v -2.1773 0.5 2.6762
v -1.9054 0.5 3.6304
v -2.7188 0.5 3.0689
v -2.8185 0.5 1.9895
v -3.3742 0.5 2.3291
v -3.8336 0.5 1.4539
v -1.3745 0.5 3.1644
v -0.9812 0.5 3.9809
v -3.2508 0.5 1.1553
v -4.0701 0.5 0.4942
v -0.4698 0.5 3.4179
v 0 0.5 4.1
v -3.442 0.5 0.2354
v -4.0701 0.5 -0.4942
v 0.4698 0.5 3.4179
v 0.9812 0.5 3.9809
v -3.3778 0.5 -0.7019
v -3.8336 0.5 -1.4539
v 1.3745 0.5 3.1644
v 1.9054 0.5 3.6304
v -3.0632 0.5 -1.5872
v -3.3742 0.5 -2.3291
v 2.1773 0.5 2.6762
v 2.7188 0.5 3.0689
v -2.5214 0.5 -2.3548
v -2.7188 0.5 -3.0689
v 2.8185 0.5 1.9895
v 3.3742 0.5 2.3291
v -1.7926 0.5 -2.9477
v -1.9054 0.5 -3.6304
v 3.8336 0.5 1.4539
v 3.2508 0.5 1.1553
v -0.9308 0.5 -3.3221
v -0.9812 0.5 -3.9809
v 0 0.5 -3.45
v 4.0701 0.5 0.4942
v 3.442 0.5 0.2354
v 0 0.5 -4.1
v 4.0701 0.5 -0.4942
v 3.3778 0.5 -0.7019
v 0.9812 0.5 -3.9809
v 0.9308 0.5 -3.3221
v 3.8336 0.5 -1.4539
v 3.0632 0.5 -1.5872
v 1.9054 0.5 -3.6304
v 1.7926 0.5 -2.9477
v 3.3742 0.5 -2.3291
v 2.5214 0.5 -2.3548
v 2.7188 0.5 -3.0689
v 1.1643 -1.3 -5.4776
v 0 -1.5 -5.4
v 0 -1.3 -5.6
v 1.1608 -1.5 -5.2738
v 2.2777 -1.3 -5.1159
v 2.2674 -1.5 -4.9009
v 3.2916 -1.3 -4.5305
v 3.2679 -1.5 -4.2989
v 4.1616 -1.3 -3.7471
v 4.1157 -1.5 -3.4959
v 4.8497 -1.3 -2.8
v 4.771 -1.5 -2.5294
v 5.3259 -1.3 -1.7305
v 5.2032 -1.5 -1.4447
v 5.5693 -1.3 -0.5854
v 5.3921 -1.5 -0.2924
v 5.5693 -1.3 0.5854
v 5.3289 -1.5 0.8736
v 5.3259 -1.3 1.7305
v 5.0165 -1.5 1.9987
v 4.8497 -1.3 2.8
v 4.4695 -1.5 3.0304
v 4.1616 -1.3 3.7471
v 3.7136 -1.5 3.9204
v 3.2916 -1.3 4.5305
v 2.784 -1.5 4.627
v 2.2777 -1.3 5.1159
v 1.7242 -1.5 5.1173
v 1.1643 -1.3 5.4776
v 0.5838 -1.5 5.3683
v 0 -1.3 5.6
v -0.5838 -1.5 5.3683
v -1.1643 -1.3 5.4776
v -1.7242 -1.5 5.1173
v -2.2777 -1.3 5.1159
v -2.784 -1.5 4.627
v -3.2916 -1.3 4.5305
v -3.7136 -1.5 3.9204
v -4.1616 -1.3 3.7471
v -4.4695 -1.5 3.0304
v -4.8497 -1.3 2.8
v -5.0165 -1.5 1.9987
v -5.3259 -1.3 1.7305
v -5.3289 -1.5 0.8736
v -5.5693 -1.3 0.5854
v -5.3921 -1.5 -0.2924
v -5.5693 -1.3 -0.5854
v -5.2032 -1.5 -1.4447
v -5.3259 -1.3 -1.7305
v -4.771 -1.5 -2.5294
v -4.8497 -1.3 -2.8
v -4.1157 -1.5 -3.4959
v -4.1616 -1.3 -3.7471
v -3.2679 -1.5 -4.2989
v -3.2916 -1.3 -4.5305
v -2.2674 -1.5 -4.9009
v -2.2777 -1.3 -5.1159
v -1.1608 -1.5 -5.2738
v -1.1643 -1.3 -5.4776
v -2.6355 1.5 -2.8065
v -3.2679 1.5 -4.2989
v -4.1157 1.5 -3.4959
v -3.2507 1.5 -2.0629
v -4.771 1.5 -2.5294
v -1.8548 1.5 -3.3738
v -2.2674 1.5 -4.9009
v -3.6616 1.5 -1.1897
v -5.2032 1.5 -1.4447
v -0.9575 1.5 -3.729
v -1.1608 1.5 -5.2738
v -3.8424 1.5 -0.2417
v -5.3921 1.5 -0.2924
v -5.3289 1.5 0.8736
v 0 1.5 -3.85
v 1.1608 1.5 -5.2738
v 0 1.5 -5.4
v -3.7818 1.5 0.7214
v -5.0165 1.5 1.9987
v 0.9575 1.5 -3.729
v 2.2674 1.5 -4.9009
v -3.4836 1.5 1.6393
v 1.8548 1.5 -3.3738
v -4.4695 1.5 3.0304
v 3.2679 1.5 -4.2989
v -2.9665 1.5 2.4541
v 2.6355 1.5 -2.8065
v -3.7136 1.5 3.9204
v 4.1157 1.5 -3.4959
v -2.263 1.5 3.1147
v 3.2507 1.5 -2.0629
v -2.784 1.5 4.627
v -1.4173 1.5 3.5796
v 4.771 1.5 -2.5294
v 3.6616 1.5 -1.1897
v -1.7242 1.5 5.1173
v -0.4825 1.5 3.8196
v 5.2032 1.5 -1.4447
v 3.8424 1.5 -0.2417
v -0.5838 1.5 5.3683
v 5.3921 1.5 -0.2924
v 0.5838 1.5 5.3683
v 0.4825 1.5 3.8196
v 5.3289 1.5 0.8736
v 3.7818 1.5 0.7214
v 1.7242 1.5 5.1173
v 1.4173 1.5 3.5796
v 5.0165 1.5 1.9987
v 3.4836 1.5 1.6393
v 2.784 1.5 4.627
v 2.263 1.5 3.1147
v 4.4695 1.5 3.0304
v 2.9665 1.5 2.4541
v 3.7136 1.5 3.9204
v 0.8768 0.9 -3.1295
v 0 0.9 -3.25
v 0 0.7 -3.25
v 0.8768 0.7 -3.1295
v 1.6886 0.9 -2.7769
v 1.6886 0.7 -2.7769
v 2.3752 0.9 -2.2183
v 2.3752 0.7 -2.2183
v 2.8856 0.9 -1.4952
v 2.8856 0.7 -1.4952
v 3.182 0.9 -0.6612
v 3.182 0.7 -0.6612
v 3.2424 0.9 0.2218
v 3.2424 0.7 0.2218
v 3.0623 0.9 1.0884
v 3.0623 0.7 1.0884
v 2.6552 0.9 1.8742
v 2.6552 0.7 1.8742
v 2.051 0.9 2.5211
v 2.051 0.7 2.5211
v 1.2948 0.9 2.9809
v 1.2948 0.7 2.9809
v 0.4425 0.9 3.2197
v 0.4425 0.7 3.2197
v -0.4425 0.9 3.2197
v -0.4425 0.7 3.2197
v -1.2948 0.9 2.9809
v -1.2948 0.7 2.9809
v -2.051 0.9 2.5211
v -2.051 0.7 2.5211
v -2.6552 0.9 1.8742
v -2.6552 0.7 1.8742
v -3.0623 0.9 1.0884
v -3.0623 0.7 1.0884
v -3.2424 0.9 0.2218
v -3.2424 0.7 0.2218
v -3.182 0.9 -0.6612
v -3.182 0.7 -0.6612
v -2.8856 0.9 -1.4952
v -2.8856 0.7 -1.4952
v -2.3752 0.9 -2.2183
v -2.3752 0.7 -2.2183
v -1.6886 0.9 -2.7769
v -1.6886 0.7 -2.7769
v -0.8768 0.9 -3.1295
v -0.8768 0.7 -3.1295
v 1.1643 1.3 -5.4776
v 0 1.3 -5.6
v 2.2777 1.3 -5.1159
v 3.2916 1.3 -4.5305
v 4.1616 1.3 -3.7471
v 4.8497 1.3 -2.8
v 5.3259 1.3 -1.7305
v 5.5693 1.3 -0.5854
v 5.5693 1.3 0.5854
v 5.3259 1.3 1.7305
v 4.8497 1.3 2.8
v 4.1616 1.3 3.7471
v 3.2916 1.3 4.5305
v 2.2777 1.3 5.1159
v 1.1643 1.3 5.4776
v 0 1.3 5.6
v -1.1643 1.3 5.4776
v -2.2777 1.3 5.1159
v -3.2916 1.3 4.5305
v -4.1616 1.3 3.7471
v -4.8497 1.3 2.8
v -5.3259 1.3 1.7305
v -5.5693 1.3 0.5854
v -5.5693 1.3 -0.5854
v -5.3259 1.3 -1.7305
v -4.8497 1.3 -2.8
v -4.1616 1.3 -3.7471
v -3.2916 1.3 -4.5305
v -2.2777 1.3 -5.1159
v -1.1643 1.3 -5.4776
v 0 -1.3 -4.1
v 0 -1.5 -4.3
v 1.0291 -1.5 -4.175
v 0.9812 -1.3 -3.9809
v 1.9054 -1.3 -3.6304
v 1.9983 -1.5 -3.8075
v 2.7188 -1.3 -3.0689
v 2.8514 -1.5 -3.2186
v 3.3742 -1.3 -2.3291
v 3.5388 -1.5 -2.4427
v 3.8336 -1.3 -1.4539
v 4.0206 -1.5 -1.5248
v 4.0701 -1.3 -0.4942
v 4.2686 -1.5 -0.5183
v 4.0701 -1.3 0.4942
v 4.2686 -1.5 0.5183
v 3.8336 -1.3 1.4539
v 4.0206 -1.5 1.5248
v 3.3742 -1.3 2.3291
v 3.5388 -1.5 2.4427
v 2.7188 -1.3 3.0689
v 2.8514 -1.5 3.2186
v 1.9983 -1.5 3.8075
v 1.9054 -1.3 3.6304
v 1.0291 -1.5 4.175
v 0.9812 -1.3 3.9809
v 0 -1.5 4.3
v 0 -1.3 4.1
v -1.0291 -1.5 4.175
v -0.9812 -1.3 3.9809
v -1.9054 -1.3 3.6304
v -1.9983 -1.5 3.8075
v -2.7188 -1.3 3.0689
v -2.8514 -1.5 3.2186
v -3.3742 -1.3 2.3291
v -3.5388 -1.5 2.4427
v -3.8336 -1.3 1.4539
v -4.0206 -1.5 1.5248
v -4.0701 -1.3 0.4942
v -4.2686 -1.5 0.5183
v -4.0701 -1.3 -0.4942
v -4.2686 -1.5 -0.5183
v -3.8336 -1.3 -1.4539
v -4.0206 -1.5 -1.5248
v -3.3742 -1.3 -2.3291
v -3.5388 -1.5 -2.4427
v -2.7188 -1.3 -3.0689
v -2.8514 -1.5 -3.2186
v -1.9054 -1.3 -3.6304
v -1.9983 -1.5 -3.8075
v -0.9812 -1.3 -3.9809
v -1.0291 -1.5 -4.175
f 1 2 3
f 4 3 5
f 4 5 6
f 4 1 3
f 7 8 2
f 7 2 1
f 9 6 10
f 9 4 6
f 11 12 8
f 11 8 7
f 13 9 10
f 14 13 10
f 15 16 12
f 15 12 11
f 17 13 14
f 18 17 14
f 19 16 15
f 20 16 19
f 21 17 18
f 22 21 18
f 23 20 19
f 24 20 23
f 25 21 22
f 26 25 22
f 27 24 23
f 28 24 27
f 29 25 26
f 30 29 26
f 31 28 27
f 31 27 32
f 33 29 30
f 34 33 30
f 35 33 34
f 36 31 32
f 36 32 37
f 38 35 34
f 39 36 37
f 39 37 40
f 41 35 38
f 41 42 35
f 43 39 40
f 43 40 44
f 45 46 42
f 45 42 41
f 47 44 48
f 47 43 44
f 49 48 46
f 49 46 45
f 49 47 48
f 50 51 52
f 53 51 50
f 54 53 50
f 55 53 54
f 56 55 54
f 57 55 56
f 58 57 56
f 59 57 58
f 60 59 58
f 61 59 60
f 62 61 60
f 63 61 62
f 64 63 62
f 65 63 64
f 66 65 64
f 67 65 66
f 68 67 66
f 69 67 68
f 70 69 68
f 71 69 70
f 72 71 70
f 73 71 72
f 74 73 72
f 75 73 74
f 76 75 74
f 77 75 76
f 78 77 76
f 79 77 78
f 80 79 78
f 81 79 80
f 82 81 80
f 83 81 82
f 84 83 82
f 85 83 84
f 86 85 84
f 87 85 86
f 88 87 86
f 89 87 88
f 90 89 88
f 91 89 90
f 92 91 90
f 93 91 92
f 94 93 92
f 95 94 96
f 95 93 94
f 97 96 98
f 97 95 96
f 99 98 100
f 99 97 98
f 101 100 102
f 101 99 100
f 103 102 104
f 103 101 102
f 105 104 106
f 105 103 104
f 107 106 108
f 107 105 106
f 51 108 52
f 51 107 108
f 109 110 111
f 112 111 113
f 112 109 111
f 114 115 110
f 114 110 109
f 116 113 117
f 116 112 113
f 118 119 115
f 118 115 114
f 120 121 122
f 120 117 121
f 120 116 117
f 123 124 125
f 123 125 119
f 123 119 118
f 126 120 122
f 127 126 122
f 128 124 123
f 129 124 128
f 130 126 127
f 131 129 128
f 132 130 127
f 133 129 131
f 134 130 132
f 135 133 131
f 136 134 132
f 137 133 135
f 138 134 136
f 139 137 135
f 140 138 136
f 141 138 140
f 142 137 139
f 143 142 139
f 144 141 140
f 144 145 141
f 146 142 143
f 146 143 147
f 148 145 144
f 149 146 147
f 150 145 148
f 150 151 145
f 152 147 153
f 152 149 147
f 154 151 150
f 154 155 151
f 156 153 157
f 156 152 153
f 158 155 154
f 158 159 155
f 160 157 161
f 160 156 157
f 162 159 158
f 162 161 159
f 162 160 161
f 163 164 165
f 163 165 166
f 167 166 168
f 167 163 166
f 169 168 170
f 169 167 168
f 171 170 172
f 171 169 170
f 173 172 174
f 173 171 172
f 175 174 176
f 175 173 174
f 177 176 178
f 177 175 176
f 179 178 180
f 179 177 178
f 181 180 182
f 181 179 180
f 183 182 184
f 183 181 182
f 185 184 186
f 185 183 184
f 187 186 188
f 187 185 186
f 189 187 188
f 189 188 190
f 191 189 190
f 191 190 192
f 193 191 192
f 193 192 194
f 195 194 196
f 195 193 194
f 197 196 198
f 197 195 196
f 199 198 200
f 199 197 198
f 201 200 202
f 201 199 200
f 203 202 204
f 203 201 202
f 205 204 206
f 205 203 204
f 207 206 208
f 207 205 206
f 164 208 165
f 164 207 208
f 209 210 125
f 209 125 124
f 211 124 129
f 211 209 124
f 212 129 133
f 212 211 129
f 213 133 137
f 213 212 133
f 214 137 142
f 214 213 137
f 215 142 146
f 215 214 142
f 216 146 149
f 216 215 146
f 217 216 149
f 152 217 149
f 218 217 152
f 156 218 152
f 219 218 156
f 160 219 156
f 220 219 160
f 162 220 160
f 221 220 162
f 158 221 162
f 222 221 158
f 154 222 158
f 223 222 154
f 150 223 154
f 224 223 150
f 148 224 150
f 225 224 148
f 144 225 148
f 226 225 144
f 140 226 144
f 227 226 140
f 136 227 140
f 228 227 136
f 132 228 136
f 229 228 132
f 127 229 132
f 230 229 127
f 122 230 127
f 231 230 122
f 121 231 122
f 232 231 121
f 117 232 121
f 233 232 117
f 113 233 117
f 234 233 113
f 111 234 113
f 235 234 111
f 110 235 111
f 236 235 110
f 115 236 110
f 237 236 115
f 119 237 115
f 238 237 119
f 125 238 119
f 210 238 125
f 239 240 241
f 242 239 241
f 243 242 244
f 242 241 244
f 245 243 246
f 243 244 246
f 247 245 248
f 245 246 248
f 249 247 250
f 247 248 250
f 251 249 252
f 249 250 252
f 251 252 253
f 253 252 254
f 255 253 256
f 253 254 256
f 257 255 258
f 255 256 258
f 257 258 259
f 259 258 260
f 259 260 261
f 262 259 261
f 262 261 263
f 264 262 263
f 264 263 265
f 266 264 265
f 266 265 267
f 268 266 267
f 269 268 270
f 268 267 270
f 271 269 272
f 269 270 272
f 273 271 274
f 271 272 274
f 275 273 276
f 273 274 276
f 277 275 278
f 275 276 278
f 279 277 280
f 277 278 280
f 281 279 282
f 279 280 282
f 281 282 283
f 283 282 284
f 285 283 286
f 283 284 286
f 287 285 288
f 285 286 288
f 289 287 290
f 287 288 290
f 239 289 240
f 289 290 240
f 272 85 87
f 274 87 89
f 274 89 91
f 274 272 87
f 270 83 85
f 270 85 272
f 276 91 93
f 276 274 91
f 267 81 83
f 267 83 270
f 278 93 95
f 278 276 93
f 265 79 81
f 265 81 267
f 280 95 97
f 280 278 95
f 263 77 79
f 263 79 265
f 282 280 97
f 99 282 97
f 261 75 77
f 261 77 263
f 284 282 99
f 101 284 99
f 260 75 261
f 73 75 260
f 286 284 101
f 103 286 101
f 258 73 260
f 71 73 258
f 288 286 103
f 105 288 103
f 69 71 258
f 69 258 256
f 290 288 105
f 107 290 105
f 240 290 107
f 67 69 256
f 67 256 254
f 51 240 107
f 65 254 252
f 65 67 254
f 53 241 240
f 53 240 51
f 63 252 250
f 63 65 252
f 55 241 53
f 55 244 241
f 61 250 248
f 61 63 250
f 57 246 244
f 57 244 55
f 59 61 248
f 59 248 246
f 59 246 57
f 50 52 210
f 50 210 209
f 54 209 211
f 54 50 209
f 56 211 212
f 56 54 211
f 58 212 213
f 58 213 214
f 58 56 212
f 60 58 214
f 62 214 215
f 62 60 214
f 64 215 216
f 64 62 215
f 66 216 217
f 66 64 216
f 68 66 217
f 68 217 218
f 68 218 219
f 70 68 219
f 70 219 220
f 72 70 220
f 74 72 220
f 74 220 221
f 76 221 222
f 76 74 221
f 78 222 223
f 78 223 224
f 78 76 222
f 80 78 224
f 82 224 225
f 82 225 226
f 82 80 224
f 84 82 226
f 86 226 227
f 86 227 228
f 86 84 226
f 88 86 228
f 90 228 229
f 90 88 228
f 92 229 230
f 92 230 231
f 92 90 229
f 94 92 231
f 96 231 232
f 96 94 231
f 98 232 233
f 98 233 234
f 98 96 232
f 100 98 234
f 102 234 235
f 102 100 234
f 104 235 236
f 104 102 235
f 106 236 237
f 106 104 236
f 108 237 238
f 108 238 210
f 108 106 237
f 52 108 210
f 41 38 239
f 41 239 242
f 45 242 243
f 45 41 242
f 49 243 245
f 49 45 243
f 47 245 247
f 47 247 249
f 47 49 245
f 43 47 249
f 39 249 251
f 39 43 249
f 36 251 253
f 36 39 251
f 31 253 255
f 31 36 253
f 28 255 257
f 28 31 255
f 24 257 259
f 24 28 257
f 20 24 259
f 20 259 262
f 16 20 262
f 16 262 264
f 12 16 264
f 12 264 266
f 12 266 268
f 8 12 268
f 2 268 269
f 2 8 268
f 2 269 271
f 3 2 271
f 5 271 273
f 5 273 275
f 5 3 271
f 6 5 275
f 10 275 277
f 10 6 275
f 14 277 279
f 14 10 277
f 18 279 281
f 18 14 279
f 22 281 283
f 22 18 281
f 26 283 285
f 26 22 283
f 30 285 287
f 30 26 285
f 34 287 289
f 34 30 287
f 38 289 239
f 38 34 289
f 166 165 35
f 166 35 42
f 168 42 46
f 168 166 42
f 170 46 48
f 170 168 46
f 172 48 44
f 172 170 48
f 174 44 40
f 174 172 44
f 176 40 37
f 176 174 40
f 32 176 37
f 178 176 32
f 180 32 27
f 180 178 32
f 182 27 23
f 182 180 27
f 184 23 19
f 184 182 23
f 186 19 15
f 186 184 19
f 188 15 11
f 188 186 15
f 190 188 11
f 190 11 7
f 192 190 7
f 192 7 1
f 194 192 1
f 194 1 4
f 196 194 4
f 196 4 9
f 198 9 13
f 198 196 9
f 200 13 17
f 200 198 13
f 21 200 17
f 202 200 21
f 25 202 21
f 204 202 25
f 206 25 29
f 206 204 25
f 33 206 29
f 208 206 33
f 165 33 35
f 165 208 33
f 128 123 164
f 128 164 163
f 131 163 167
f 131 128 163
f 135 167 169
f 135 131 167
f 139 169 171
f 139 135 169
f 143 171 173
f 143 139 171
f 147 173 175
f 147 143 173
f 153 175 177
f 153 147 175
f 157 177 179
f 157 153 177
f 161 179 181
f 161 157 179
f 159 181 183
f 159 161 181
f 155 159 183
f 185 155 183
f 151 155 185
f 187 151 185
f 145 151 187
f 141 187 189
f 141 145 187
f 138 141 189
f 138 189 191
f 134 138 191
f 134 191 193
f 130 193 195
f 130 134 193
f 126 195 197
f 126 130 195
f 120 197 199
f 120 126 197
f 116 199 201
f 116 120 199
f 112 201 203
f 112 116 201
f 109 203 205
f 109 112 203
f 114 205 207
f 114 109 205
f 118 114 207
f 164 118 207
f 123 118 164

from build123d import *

# Parameters (mm, degrees)
FASE1_SIZE = 0.2
FASE2_SIZE = 0.6


with BuildPart() as part:
    # Skizze1 → Rotation1 (revolve)
    with BuildSketch(Plane(origin=(0, 0, 0), x_dir=(0, 0, -1), z_dir=(1, 0, 0))):
        Polygon((4.1, -1.5), (4.1, 0.5), (3.25, 0.5), (3.25, 1.5), (5.6, 1.5), (5.6, -1.5), align=None)
    revolve(axis=Axis((0, 14.193037975, 0), (0, -1, 0)))

    # Fase1
    fase1_edges = [part.edges().sort_by_distance(p)[0] for p in [
        (0, -1.5, 5.6),
        (0, 1.5, 5.6),
        (0, 0.5, 3.25),
        (0, -1.5, 4.1),
    ]]
    chamfer(fase1_edges, length=FASE1_SIZE)

    # Fase2
    fase2_edges = [part.edges().sort_by_distance(p)[0] for p in [
        (0, 1.5, 3.25),
    ]]
    chamfer(fase2_edges, length=FASE2_SIZE)


solid = part.part
